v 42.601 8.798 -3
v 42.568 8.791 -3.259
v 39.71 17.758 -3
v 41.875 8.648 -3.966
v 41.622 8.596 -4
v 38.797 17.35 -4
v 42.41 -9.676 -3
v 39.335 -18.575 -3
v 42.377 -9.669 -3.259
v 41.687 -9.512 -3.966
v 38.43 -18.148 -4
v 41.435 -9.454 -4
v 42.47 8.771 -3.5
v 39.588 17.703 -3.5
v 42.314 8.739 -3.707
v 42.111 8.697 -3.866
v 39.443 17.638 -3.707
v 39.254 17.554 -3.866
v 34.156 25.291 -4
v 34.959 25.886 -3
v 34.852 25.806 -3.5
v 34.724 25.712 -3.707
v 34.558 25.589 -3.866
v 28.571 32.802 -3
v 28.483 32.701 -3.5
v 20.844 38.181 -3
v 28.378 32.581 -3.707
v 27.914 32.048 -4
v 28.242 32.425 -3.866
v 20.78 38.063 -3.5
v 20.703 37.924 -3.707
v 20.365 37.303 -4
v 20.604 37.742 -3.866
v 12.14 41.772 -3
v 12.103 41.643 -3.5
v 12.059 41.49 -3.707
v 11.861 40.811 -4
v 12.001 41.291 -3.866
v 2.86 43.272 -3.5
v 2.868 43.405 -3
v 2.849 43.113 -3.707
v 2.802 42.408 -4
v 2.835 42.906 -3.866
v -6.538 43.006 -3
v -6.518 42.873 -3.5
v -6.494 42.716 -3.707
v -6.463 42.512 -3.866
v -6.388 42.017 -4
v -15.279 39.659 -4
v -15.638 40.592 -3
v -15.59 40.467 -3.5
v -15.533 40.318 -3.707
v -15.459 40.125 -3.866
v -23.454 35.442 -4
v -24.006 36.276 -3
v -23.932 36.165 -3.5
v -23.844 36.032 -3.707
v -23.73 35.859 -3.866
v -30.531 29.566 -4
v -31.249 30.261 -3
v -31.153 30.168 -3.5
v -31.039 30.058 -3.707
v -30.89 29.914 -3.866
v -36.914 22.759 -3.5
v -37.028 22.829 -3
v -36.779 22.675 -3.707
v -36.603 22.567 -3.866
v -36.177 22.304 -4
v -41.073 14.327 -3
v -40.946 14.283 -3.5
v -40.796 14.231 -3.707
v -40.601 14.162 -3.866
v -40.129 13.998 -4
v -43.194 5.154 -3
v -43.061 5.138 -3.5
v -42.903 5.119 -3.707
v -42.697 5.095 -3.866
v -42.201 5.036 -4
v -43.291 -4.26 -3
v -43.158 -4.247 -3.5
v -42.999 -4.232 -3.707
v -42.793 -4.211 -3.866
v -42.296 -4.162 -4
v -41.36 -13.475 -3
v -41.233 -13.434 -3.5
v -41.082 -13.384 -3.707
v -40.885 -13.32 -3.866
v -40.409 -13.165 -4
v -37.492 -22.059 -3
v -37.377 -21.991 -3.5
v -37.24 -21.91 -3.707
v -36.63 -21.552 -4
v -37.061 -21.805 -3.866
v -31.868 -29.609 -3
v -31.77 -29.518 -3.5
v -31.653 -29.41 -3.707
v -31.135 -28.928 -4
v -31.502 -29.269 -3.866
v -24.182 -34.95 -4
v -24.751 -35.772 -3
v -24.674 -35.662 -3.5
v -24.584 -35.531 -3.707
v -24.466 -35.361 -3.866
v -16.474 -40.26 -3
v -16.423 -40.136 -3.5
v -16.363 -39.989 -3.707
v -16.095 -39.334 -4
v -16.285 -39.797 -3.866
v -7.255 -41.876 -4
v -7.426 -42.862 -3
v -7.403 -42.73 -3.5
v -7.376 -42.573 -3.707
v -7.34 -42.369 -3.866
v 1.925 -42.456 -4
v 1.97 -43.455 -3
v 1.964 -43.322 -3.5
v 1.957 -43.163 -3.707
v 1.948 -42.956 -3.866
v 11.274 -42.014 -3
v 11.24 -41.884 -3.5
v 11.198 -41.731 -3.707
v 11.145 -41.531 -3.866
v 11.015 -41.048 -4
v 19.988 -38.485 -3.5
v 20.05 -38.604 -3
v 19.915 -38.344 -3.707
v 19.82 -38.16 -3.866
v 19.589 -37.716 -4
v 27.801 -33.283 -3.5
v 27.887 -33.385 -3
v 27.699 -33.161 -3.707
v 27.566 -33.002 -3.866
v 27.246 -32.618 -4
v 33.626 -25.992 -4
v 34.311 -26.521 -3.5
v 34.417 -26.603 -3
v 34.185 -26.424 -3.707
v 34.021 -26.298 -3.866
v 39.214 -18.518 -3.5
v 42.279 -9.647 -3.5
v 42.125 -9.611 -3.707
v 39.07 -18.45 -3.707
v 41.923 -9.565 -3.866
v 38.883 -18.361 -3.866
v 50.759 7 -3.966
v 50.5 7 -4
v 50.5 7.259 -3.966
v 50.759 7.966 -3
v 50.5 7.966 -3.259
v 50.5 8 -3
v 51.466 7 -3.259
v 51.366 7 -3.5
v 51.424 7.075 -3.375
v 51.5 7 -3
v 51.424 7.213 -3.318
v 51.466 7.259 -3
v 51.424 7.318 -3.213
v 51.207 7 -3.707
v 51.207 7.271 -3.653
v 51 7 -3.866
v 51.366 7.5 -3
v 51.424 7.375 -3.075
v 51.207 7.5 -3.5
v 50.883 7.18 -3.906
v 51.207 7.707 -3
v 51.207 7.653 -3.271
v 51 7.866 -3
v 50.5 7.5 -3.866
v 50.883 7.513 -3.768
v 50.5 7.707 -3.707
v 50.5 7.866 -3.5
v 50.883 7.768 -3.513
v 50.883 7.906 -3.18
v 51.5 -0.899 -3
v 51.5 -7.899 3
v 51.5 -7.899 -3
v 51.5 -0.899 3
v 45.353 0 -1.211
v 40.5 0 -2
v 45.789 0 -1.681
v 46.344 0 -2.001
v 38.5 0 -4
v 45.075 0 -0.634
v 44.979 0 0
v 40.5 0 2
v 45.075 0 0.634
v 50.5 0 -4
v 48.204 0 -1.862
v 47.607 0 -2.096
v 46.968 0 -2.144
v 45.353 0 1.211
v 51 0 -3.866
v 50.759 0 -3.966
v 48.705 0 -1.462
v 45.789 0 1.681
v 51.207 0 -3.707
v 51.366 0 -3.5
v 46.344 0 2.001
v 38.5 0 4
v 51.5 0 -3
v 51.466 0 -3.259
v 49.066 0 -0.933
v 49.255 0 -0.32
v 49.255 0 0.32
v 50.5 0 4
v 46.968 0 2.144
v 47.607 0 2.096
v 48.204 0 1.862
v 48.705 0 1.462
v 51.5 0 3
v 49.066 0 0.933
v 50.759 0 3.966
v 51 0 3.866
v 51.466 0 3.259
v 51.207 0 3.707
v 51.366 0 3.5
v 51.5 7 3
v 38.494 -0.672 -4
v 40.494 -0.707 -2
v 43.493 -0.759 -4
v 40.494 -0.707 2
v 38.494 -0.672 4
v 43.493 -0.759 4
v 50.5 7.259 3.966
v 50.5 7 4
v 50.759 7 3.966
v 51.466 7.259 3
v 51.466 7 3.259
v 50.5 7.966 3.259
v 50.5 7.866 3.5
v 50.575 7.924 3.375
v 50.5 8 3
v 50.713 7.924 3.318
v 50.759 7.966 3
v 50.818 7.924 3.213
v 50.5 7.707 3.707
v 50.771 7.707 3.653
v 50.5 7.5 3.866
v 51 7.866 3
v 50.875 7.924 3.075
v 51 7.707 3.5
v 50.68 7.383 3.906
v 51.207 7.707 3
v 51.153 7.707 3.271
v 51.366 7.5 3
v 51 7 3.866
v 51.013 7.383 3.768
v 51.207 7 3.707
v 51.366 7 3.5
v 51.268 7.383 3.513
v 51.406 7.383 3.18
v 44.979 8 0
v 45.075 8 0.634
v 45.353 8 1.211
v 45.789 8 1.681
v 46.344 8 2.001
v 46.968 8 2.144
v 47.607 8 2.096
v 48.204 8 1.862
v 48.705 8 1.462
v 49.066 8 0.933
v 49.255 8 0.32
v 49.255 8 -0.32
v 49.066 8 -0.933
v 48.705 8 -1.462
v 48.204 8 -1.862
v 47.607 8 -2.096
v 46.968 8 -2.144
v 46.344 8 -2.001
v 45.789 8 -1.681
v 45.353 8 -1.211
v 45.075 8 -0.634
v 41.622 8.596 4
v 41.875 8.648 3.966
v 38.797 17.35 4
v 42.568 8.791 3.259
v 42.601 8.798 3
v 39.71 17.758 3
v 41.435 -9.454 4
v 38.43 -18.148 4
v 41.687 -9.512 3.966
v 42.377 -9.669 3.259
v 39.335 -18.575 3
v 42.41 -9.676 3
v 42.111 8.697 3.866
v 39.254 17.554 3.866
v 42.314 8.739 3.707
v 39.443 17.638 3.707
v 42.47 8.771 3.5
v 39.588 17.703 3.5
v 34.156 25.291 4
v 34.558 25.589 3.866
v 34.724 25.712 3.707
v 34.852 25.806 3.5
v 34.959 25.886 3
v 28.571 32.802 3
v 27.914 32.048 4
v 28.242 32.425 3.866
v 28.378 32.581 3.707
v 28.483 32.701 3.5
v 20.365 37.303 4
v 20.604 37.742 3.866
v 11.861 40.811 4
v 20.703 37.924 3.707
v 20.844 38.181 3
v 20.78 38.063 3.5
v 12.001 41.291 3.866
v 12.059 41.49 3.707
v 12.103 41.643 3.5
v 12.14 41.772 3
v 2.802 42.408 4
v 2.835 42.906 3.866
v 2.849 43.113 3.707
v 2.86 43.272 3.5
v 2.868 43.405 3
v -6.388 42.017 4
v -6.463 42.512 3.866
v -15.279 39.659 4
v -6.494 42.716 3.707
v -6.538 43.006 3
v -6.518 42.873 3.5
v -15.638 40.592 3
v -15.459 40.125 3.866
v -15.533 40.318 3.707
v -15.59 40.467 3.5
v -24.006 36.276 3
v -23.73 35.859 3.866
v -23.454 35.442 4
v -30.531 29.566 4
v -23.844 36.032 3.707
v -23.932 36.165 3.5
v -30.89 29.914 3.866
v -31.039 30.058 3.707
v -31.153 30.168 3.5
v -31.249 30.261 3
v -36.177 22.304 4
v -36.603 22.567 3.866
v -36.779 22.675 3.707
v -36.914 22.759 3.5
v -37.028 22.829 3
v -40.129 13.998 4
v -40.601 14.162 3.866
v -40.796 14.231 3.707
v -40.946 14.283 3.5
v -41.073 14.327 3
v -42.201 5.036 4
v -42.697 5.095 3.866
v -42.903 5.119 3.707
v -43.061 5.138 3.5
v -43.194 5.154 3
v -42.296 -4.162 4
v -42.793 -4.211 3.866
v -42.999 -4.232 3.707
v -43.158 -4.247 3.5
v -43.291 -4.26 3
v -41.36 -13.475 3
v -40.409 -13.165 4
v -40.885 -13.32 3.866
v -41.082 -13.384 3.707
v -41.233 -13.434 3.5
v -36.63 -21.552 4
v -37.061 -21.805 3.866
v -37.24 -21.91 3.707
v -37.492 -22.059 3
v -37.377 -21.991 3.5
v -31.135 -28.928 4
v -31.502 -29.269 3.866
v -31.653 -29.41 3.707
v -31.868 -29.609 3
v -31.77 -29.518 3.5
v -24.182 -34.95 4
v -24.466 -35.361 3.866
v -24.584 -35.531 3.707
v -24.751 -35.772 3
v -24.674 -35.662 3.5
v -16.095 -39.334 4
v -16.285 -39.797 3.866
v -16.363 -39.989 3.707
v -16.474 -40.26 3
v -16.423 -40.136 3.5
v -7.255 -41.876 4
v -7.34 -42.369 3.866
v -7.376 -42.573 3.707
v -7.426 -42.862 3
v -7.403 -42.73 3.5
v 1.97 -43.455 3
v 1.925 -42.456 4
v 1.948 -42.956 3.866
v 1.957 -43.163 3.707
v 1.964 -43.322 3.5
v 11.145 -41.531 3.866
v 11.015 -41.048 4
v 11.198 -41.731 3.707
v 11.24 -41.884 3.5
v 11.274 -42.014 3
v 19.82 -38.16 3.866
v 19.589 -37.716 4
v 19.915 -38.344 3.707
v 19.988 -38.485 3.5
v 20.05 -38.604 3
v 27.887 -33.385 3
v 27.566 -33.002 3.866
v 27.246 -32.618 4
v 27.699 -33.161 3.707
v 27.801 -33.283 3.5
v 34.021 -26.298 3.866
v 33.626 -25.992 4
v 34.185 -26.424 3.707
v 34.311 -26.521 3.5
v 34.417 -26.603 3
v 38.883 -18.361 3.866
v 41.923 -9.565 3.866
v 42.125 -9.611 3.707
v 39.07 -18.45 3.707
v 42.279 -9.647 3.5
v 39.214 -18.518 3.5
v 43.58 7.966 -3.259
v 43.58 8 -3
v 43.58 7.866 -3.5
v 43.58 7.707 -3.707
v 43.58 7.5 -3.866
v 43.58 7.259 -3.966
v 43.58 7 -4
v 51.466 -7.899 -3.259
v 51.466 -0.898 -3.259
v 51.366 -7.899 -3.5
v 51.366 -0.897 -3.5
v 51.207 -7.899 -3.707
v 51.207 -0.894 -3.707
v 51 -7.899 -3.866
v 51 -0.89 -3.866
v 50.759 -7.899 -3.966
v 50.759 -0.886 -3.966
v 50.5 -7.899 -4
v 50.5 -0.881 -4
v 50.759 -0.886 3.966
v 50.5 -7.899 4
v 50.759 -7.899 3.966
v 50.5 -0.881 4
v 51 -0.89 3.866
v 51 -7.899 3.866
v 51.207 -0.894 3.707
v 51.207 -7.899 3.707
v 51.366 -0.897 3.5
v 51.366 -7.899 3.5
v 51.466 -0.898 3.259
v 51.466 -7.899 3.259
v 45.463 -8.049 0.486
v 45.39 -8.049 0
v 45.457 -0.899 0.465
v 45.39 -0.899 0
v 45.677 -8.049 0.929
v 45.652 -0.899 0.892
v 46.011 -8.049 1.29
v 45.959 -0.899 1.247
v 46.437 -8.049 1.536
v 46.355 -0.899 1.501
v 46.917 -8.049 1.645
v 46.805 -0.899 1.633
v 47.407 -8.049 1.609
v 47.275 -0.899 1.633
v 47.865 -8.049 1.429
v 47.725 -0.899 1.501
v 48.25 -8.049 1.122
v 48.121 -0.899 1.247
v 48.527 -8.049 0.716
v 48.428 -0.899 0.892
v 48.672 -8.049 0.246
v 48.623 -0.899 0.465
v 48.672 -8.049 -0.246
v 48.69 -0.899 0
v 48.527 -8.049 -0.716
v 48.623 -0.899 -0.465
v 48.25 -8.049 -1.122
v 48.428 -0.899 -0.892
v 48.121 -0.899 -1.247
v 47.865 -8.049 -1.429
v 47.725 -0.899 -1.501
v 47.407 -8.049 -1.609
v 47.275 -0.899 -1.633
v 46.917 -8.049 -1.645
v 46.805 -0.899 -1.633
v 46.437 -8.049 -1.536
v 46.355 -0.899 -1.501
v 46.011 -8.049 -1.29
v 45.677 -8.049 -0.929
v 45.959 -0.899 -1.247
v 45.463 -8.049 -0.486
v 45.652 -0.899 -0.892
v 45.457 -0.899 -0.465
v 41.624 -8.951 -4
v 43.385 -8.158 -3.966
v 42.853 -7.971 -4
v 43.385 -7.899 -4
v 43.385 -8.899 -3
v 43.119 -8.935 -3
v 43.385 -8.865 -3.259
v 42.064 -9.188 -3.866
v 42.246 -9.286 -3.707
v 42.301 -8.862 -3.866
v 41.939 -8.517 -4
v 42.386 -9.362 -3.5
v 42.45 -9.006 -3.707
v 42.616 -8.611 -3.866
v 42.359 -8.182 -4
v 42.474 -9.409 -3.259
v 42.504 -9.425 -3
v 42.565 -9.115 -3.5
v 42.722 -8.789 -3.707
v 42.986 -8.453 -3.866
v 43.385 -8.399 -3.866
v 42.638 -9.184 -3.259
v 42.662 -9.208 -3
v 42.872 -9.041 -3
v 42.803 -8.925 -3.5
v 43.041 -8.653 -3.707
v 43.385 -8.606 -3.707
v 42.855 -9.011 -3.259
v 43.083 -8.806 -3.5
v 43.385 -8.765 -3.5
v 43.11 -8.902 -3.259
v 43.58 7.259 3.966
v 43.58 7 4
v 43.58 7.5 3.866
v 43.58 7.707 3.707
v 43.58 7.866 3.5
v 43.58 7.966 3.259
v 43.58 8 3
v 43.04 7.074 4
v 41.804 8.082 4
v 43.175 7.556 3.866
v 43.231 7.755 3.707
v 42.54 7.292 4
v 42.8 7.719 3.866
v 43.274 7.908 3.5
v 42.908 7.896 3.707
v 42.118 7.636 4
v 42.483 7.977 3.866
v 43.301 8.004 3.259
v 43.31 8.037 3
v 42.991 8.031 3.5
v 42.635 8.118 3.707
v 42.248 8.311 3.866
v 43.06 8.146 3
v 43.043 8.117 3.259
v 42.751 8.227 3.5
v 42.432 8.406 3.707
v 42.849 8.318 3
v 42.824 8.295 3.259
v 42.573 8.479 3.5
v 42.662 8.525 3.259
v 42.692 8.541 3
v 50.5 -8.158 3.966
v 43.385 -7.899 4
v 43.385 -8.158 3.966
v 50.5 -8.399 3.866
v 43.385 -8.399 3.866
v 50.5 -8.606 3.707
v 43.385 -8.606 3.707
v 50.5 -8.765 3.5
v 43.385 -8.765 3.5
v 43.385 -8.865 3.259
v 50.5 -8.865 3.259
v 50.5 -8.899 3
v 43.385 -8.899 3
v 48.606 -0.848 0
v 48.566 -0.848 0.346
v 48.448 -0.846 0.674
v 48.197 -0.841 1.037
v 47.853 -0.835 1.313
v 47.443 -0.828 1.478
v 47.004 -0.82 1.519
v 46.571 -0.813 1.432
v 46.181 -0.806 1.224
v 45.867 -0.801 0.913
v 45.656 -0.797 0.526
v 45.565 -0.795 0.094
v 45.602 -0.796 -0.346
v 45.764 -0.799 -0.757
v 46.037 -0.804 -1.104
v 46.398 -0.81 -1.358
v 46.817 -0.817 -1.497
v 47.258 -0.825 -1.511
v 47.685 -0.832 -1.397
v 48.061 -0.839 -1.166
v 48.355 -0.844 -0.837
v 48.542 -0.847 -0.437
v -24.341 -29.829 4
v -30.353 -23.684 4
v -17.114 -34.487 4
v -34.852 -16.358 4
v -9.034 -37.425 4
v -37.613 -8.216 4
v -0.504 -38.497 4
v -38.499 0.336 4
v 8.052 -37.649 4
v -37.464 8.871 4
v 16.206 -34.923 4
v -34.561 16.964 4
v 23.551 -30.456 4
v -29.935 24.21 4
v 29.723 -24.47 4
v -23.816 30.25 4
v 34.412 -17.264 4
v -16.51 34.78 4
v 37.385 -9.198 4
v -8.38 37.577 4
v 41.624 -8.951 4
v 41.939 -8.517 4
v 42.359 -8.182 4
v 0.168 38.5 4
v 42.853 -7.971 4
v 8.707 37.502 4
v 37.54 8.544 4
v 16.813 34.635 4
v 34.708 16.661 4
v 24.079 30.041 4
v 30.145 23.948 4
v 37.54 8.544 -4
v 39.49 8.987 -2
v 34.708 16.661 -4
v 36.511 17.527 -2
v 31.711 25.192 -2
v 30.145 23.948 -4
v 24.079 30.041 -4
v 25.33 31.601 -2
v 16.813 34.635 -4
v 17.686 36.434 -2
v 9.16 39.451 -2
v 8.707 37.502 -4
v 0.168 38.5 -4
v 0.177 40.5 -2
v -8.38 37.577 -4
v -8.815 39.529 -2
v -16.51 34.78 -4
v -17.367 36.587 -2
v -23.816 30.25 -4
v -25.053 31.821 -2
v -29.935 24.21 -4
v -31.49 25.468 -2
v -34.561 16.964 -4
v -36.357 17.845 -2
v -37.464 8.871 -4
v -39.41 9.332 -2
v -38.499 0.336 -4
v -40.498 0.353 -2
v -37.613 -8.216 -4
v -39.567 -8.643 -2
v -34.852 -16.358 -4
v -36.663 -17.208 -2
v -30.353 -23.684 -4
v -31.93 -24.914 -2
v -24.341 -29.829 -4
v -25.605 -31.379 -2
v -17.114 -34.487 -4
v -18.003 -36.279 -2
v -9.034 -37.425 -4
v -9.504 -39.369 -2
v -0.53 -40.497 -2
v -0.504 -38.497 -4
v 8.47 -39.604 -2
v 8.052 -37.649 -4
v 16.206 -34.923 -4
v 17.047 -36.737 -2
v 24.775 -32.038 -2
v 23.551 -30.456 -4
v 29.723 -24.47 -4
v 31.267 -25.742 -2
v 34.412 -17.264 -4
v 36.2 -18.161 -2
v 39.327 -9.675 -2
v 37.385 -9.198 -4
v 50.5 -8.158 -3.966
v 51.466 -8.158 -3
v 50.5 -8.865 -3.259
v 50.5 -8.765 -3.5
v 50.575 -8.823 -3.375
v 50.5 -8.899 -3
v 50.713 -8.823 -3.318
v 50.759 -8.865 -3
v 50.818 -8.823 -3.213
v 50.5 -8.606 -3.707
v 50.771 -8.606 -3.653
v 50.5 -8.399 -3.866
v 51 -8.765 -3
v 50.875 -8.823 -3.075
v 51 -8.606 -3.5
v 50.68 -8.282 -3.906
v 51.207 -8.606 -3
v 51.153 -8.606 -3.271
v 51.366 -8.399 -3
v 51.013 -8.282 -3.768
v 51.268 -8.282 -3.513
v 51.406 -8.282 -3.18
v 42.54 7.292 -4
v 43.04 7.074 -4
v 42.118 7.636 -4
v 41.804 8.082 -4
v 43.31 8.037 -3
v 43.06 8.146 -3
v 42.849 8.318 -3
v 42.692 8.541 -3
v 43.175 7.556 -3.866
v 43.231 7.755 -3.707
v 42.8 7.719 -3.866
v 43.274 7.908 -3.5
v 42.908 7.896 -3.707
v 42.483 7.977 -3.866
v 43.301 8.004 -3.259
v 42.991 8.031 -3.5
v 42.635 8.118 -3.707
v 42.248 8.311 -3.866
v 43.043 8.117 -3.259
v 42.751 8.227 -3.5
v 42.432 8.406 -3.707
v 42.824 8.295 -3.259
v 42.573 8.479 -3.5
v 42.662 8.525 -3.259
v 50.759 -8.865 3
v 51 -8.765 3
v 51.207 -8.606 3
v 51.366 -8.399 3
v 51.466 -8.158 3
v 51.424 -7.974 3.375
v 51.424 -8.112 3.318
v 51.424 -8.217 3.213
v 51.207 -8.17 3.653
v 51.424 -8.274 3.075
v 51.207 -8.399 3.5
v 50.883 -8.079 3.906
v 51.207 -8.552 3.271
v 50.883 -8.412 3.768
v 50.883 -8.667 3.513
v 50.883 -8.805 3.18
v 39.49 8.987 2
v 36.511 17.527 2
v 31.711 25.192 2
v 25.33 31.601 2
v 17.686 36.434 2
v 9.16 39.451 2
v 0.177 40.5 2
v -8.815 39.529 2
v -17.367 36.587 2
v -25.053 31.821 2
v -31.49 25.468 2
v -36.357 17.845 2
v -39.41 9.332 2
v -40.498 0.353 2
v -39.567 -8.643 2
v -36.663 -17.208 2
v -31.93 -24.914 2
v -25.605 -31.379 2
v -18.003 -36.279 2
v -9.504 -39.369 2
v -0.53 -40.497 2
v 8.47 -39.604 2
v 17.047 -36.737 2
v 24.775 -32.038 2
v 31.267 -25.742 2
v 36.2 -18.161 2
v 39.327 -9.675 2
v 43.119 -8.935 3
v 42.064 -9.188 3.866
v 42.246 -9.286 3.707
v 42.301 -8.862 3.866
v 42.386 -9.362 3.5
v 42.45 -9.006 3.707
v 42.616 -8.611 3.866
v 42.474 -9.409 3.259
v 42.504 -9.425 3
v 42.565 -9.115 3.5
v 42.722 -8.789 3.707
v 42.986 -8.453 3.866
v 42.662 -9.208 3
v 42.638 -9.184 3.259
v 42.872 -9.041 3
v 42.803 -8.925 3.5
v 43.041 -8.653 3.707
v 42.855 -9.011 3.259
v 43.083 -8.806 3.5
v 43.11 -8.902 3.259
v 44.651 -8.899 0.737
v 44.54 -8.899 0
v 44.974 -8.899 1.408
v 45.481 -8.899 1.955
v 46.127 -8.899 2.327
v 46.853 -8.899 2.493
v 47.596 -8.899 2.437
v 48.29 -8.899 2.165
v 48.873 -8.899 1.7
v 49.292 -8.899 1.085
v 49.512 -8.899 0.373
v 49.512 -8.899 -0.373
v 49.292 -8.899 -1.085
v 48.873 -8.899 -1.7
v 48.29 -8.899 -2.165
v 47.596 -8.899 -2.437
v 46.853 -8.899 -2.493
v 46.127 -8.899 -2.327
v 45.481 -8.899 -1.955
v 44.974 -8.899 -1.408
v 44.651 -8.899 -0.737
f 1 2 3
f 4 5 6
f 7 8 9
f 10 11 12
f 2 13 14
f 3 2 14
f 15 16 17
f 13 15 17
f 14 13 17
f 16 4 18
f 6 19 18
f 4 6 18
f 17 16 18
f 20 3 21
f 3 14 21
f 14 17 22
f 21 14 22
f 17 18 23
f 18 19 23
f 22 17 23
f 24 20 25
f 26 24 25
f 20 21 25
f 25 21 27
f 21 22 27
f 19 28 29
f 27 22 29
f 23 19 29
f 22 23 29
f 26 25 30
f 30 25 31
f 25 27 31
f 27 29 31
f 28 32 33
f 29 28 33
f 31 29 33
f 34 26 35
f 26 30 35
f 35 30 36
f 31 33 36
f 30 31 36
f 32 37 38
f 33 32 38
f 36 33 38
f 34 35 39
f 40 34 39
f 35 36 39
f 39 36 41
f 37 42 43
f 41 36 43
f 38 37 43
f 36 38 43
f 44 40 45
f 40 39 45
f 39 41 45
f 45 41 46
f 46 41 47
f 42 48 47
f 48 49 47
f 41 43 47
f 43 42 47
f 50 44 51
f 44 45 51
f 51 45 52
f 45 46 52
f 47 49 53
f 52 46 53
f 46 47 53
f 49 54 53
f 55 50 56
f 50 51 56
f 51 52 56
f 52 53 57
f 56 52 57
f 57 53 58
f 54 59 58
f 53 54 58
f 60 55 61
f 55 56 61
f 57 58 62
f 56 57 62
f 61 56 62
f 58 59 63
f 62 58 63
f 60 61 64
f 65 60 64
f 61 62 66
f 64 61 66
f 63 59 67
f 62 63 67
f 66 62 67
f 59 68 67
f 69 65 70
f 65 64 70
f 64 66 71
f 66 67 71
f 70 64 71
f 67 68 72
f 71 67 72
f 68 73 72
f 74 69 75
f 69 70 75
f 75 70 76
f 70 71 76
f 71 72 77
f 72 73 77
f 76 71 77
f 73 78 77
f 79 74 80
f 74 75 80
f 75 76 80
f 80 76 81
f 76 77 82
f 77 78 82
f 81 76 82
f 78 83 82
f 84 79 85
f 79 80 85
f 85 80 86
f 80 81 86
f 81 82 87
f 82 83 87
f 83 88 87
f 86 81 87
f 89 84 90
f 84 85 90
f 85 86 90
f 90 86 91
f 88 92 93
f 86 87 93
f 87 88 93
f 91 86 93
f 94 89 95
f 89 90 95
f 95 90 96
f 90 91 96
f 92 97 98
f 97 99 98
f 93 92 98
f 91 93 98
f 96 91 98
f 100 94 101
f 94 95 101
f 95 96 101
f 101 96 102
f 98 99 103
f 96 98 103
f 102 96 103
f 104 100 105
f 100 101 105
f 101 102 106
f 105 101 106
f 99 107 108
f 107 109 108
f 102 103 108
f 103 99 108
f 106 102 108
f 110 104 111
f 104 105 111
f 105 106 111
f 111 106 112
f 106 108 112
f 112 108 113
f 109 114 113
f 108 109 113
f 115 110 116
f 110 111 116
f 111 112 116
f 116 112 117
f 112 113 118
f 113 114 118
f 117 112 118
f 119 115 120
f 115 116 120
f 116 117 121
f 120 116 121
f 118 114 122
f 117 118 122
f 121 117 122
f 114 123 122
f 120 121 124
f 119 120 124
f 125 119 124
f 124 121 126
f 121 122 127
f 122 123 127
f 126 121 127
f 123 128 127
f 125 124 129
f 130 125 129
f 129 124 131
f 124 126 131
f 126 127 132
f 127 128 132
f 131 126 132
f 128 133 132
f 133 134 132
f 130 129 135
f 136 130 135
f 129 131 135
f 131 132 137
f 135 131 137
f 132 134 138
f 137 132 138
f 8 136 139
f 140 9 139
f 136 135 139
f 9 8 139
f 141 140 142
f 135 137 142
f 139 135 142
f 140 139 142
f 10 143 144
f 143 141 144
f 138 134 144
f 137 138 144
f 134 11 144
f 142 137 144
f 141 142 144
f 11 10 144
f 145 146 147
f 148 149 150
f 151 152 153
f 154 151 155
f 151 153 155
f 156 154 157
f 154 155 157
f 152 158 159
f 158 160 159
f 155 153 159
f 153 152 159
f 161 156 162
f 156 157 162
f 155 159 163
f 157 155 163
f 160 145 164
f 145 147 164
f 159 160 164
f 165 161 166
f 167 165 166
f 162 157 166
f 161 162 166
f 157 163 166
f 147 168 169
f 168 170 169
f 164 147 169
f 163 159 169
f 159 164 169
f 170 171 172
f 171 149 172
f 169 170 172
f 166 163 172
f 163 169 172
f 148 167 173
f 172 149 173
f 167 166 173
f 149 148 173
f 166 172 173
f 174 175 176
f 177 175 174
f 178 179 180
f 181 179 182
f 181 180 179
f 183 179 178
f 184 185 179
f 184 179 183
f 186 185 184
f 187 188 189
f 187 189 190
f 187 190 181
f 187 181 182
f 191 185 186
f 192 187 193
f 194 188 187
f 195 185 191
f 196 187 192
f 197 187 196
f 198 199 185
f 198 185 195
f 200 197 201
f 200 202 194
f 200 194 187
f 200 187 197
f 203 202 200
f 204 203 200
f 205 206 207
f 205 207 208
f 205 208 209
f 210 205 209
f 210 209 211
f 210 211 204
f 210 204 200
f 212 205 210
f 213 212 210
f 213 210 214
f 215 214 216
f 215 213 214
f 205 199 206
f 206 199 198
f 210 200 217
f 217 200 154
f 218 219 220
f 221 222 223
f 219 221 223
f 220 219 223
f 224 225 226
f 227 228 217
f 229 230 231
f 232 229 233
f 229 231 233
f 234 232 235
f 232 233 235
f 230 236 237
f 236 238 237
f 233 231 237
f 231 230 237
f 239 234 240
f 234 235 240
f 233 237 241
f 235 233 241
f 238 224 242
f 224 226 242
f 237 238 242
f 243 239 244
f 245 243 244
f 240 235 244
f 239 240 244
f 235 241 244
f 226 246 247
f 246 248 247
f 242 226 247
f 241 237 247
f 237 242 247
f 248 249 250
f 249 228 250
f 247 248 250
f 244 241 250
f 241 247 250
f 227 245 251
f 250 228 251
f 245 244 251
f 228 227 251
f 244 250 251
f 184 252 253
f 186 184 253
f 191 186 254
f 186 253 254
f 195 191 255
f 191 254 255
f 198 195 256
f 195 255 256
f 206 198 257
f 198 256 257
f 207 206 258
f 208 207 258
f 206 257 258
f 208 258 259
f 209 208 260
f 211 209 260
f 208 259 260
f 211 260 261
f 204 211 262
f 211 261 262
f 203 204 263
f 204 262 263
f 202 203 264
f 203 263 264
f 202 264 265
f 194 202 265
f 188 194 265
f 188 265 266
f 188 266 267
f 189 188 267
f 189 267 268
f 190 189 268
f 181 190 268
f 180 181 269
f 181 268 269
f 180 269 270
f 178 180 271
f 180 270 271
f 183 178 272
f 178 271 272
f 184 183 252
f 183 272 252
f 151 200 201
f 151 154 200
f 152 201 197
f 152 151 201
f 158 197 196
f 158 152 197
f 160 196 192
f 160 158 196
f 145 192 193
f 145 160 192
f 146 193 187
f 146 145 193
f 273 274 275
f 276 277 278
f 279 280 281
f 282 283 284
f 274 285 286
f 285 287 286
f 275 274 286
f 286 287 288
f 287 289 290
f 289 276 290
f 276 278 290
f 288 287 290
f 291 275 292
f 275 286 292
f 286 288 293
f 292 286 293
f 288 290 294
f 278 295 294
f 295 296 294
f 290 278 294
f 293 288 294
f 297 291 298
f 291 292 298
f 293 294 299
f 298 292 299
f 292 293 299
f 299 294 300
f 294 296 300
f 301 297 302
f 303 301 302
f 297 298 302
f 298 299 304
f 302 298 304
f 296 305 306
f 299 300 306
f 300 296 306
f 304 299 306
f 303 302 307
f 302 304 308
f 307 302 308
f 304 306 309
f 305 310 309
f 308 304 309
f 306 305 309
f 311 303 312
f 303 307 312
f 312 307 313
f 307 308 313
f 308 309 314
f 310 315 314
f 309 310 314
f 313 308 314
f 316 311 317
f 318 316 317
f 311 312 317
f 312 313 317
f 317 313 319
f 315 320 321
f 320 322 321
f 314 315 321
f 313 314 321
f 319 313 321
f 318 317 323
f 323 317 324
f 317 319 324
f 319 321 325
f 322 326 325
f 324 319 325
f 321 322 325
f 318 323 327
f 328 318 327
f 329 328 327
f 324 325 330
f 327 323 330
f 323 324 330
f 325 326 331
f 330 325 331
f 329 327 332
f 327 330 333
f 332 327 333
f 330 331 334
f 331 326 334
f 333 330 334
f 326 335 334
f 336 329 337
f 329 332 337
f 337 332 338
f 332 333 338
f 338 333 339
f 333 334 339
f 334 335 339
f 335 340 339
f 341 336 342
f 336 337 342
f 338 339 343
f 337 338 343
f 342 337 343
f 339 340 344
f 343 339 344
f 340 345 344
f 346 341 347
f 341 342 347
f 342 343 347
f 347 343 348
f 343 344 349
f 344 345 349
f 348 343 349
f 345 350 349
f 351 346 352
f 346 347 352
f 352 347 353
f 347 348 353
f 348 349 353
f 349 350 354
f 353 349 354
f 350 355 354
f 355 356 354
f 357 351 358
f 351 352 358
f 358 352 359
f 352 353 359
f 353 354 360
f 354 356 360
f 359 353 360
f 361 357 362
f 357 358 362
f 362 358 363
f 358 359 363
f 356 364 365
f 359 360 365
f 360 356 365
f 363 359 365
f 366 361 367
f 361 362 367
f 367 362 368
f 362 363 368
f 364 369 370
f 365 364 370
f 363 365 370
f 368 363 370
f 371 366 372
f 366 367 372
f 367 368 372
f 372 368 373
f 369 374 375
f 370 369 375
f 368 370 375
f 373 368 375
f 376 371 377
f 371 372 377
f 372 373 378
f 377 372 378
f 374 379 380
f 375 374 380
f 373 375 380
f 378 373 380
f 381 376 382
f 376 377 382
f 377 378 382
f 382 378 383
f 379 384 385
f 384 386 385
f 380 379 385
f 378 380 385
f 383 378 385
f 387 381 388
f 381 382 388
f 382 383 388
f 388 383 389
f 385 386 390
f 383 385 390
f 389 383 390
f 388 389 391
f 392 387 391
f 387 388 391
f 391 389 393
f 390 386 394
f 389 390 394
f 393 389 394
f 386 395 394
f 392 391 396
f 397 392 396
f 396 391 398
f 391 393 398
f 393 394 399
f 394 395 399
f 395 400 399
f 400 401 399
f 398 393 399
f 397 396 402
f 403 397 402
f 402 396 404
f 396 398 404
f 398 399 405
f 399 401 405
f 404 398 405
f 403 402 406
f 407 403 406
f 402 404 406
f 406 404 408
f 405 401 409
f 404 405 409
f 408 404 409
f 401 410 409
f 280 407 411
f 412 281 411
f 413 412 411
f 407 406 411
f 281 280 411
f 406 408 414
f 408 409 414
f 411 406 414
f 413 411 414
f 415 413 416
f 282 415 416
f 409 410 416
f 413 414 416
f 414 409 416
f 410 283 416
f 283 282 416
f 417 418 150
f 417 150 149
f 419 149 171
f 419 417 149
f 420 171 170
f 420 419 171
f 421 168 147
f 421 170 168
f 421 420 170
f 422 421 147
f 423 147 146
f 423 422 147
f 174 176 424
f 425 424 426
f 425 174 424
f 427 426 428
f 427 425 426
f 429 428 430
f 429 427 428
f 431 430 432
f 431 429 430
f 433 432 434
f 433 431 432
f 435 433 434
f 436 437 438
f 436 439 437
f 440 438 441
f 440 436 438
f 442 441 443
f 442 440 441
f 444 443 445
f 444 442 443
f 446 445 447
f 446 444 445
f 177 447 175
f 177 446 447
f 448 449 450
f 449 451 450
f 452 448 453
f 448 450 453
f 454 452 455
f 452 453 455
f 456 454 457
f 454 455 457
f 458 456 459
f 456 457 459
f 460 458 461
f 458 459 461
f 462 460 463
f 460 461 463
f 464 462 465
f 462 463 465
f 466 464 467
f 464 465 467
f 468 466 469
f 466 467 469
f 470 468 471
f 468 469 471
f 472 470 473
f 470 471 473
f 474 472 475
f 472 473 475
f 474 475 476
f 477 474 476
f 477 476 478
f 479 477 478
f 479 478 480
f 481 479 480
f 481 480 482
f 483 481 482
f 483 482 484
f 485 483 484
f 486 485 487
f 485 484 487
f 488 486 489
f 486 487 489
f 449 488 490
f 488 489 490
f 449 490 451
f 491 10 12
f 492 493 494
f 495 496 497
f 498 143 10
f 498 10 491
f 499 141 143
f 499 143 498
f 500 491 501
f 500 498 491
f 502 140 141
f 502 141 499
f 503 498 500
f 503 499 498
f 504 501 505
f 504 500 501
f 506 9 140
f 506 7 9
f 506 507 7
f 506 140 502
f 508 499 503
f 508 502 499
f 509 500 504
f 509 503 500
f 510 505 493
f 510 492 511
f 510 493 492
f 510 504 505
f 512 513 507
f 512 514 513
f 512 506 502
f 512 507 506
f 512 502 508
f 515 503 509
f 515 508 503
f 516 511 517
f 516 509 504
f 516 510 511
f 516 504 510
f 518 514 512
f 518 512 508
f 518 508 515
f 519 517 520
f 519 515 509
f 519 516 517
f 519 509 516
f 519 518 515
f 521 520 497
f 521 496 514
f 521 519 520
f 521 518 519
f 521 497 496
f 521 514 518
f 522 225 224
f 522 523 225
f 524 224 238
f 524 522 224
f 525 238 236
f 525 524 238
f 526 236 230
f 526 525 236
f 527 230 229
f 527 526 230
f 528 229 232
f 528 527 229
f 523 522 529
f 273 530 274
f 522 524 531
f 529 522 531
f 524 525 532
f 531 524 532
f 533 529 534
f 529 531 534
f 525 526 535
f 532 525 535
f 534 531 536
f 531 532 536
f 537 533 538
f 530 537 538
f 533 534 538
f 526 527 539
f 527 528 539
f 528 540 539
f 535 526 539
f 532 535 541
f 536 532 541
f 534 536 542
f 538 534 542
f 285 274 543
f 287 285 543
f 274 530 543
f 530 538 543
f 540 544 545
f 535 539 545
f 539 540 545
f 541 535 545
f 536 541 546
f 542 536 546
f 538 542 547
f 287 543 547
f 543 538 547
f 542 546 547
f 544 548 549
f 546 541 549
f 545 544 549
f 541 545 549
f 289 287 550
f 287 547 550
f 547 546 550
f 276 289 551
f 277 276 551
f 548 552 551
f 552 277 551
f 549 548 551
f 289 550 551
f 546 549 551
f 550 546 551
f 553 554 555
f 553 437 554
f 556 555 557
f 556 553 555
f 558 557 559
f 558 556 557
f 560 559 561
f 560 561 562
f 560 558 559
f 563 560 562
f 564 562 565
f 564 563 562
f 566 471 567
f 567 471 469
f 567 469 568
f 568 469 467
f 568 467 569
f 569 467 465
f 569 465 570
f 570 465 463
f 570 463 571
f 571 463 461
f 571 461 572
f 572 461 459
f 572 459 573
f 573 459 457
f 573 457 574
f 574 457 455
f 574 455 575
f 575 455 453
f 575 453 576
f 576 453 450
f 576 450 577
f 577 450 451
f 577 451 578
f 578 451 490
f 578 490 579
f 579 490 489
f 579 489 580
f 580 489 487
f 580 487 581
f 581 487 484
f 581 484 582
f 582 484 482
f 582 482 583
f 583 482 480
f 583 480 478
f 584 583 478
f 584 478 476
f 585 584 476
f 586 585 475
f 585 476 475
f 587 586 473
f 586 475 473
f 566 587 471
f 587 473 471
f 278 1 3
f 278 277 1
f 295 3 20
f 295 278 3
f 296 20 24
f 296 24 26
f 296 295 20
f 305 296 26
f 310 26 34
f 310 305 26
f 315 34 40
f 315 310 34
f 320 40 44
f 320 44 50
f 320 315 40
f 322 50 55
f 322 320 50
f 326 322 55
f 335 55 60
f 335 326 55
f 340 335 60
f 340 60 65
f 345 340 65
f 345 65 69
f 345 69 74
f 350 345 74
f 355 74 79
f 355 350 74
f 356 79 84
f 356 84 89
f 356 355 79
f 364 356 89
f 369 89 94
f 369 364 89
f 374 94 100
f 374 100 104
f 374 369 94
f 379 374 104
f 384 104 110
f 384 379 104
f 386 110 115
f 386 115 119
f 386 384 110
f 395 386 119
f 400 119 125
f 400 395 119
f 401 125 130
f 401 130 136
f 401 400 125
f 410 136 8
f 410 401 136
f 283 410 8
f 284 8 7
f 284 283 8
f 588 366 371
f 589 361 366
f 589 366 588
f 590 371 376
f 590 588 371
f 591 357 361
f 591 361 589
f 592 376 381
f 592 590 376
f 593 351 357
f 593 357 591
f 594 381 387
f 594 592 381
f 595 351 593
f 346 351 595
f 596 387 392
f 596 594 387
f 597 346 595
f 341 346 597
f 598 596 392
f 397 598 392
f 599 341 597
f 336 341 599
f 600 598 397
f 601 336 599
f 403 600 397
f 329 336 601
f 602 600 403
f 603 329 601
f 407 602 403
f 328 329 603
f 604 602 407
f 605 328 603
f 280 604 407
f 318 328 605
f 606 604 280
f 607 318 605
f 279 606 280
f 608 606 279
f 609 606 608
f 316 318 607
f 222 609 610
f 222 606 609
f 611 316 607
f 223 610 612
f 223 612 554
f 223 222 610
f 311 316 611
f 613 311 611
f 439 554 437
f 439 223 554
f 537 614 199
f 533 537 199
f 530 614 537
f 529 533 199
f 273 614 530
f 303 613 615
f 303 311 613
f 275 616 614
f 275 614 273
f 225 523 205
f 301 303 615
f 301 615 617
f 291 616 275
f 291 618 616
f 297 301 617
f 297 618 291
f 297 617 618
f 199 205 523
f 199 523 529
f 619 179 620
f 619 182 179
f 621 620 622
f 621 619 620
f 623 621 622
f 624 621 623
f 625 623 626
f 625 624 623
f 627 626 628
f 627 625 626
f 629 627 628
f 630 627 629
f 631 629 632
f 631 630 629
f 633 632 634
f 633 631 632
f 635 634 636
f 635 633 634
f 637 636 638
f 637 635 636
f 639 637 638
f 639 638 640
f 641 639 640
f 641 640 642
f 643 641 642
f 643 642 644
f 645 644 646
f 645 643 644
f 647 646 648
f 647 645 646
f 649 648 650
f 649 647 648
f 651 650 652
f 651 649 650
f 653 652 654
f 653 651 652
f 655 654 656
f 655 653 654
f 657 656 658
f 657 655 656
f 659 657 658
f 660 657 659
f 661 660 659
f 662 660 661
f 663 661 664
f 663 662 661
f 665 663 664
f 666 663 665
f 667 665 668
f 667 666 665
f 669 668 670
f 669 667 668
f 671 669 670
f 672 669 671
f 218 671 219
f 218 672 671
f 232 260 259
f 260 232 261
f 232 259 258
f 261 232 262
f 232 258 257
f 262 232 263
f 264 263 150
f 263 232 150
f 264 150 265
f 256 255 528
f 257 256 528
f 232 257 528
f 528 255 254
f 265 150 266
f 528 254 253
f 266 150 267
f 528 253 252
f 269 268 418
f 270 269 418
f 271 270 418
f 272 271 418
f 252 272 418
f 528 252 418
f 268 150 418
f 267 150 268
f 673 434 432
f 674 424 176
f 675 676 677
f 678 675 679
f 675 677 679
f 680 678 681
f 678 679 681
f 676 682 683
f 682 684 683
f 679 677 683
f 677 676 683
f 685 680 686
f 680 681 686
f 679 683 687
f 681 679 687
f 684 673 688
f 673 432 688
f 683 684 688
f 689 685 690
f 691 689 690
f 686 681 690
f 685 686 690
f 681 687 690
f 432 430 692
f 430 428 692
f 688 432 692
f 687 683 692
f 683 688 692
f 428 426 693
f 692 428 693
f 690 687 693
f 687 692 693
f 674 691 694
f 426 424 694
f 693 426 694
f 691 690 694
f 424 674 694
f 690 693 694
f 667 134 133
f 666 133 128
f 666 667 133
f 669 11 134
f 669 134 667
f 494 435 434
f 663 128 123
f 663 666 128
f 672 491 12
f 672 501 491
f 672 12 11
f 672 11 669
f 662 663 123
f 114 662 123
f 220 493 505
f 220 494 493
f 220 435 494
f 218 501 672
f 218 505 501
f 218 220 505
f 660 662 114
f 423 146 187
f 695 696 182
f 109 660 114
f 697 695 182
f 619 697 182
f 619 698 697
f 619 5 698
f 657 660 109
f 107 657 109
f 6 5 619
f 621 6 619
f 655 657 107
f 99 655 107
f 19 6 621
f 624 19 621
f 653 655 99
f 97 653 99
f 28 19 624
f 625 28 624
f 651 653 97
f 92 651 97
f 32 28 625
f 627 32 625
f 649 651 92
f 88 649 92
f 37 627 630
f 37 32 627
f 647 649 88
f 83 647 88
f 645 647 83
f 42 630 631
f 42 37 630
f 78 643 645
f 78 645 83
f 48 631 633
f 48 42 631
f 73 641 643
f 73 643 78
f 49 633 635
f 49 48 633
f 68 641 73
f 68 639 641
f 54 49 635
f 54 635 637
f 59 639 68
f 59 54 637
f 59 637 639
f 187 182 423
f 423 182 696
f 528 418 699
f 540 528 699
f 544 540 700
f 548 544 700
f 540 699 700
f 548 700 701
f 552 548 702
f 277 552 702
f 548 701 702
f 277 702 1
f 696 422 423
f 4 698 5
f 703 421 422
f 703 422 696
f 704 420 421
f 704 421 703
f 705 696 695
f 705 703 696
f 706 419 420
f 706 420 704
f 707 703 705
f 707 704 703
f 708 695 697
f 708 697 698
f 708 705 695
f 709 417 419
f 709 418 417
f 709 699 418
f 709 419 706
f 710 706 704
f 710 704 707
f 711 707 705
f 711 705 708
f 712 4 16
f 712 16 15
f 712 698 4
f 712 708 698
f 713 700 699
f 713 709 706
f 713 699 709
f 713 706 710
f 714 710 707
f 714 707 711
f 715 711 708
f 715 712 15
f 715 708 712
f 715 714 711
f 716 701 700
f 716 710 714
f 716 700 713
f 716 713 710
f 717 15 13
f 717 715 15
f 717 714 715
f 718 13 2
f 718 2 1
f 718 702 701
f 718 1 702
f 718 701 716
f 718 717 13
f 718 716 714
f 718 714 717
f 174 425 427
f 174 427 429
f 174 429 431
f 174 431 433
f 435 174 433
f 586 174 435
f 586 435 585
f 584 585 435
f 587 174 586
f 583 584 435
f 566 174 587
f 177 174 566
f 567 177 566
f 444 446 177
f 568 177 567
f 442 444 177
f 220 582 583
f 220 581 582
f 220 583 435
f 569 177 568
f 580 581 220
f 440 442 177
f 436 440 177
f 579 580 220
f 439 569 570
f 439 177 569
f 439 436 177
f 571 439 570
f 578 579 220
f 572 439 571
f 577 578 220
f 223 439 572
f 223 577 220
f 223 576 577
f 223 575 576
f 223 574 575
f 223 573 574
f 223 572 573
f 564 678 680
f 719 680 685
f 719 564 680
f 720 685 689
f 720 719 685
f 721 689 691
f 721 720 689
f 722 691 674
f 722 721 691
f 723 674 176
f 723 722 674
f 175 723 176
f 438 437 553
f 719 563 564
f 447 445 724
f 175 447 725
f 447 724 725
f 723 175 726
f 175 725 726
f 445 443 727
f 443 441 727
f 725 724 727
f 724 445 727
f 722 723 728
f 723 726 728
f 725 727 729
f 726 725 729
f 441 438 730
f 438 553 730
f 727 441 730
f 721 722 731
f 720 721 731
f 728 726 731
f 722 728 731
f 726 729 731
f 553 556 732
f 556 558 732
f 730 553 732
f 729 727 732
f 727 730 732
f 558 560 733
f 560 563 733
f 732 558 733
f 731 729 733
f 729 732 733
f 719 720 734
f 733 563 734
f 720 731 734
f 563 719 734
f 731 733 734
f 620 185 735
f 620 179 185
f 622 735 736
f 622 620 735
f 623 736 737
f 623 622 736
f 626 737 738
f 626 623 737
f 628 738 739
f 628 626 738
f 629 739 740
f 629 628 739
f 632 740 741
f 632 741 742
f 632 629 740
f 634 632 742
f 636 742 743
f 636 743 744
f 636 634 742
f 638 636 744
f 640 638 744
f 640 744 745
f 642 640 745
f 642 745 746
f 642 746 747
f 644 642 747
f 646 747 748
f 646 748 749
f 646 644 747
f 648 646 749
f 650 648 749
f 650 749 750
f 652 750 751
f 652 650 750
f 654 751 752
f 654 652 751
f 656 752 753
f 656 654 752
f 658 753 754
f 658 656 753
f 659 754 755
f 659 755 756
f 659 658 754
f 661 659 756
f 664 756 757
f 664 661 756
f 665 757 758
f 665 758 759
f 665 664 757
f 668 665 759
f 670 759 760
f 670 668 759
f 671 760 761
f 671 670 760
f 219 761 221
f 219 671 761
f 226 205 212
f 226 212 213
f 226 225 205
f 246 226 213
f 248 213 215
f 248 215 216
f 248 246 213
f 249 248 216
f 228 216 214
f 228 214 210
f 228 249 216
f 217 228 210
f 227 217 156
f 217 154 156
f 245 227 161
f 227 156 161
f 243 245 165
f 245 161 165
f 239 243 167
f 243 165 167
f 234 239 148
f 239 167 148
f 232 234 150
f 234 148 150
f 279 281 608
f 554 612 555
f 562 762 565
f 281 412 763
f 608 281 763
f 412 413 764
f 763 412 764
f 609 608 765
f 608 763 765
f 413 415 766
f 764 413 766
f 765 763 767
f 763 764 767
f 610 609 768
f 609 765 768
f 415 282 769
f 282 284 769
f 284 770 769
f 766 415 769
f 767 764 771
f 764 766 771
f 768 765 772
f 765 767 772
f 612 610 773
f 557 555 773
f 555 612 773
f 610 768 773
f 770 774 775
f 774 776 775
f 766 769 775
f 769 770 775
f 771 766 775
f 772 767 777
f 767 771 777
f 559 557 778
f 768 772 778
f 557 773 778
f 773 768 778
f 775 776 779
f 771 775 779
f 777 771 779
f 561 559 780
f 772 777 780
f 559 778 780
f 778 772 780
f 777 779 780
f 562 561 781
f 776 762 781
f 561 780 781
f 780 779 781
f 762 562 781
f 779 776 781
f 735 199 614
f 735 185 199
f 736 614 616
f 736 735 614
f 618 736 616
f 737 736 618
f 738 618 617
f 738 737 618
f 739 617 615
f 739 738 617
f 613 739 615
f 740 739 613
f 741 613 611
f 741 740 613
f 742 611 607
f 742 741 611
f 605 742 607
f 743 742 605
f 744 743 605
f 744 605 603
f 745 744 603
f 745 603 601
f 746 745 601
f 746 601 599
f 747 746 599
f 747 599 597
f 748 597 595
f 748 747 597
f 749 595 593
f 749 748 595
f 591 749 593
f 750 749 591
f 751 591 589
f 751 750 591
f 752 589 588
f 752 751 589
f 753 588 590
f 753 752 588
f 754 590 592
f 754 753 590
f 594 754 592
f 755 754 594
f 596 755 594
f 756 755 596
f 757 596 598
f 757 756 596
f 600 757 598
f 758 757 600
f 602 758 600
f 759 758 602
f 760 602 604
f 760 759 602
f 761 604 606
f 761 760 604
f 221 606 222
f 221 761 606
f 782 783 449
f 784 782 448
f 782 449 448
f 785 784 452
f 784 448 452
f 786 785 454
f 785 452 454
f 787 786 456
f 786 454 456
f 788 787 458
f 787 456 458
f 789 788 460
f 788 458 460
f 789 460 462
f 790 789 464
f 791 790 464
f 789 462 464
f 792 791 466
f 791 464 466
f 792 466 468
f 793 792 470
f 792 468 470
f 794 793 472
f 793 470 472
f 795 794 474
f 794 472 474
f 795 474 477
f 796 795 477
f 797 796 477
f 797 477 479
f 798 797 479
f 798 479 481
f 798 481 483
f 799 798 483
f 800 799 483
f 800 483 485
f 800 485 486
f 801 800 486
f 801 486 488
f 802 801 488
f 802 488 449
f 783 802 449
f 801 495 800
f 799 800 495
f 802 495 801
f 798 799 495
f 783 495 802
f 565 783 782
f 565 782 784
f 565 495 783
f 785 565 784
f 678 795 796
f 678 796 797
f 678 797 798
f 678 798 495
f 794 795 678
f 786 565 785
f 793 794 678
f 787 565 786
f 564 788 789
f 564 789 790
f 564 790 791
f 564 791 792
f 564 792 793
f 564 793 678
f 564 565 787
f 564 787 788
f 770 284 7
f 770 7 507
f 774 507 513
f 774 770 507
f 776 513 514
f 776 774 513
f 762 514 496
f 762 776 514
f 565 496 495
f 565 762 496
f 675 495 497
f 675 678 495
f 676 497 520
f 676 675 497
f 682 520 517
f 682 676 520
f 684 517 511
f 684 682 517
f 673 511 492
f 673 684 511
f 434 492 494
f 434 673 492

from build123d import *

# Parameters (mm, degrees)
F1_ANGLE       = 359
F3_DEPTH       = 4
F5_D           = 3.3
F5_DEPTH       = 8
F5_CSINK_D     = 5
F5_CSINK_ANGLE = 90
F5_TIP         = 0.9914200214
F6_R           = 2.15
F7_DEPTH       = 8
F8_R           = 1


with BuildPart() as f1:
    # F0 (on Front) → F1 (revolve)
    with BuildSketch(Plane.XZ):
        Polygon((38.5, 4), (40.5, 2), (40.5, -2), (38.5, -4), (43.5, -4), (43.5, 4), align=None)
    revolve(axis=Axis((0, 0, 13.8600002974), (0, 0, 1)), revolution_arc=F1_ANGLE)

    # F2 (on Top) → F3 (join, symmetric)
    with BuildSketch(Plane.XY):
        Polygon((42.7580401796, 8), (42.6183996602, 0), (43.5, 0), (51.5, 0), (51.5, 8), align=None)
        Polygon((42.5800298362, -0.7432371854), (42.5800298362, -8.8989358438), (51.5, -8.8989358438), (51.5, -0.8989358438), (43.4933747393, -0.75917968), align=None)
    extrude(amount=F3_DEPTH, both=True)

    # F5
    with Locations(Plane.XZ.offset(8.8989358438)):
        with Locations((47.0400149181, 0)):
            CounterSinkHole(F5_D / 2, F5_CSINK_D / 2, depth=F5_DEPTH, counter_sink_angle=F5_CSINK_ANGLE)
            with Locations((0, 0, -(F5_DEPTH + F5_TIP / 2))):  # 118° drill point
                Cone(0, F5_D / 2, F5_TIP, mode=Mode.SUBTRACT)

    # F6 (on face) → F7 (cut, through all)
    with BuildSketch(Plane(origin=(0, 8, 0), x_dir=(-1, 0, 0), z_dir=(0, 1, 0))):
        with Locations((-47.1290200898, 0)):
            Circle(F6_R)
    extrude(amount=-F7_DEPTH, mode=Mode.SUBTRACT)

    # F8
    f8_edges = [f1.edges().sort_by_distance(p)[0] for p in [
        (47.12902, 8, -4),
        (-43.497587, 0.458196, -4),
        (51.5, 4, -4),
        (51.5, -4.898936, -4),
        (47.040015, -8.898936, -4),
        (51.5, 4, 4),
        (47.12902, 8, 4),
        (-43.497587, 0.458196, 4),
        (47.040015, -8.898936, 4),
        (51.5, -4.898936, 4),
        (51.5, -8.898936, 0),
        (51.5, 8, 0),
        (42.75804, 8, 0),
        (42.58003, -8.898936, 0),
    ]]
    fillet(f8_edges, radius=F8_R)


solid = f1.part
